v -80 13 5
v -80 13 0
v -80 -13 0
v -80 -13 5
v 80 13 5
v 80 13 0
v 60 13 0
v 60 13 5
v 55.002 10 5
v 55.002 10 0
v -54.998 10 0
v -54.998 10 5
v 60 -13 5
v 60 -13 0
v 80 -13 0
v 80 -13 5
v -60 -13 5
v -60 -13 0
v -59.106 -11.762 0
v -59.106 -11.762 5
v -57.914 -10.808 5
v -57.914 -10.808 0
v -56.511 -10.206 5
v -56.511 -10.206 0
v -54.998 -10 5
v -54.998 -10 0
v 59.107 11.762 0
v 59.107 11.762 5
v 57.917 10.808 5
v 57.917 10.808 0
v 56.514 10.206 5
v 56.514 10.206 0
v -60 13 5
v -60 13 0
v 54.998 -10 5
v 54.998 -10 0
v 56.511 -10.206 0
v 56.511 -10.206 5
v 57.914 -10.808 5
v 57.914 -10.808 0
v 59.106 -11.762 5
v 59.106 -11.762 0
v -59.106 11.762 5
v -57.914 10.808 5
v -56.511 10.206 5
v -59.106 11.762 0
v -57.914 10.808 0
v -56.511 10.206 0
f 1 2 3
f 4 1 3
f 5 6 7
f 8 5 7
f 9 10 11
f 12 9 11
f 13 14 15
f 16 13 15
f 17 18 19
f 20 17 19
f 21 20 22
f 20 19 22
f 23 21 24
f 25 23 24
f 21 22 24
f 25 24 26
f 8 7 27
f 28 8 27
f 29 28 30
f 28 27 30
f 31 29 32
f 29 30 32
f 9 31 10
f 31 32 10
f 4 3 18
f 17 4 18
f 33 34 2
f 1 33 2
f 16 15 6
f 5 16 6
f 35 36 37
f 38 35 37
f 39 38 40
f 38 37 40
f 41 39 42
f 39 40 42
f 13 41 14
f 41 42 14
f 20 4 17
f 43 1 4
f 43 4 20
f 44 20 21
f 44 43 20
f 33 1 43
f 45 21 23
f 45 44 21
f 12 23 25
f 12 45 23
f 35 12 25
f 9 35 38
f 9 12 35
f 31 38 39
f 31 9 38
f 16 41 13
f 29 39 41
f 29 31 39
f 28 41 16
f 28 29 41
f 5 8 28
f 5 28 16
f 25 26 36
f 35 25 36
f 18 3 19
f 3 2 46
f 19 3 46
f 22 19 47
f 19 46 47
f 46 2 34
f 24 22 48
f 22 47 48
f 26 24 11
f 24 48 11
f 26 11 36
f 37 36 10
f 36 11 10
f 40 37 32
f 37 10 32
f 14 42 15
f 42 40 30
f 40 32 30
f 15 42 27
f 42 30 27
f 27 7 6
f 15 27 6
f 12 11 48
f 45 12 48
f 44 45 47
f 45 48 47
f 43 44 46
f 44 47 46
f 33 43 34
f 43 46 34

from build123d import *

# Parameters (mm, degrees)
F1_DEPTH = 5


with BuildPart() as f1:
    # F0 (on Top) → F1 (new body)
    with BuildSketch(Plane.XY):
        with BuildLine():
            Line((-54.998, -10), (0, -10))
            Line((0, -10), (0, 0))
            Line((0, 0), (-80, 0))
            Line((-80, 0), (-80, -13))
            Line((-80, -13), (-60, -13))
            ThreePointArc((-60, -13), (-57.914334, -10.807501), (-54.998, -10))
        make_face()
        with BuildLine():
            ThreePointArc((54.998, -10), (57.914334, -10.807501), (60, -13))
            Line((60, -13), (80, -13))
            Line((80, -13), (80, 0))
            Line((80, 0), (0, 0))
            Line((0, 0), (0, -10))
            Line((0, -10), (54.998, -10))
        make_face()
        with BuildLine():
            Line((-80, 0), (0, 0))
            Line((0, 0), (0, 10))
            Line((0, 10), (-54.998, 10))
            ThreePointArc((-54.998, 10), (-57.914334, 10.807501), (-60, 13))
            Line((-60, 13), (-80, 13))
            Line((-80, 13), (-80, 0))
        make_face()
        with BuildLine():
            Line((0, 0), (80, 0))
            Line((80, 0), (80, 13))
            Line((80, 13), (60, 13))
            ThreePointArc((60, 13), (57.916618, 10.80758), (55.002, 10))
            Line((55.002, 10), (0, 10))
            Line((0, 10), (0, 0))
        make_face()
    extrude(amount=F1_DEPTH)


solid = f1.part
